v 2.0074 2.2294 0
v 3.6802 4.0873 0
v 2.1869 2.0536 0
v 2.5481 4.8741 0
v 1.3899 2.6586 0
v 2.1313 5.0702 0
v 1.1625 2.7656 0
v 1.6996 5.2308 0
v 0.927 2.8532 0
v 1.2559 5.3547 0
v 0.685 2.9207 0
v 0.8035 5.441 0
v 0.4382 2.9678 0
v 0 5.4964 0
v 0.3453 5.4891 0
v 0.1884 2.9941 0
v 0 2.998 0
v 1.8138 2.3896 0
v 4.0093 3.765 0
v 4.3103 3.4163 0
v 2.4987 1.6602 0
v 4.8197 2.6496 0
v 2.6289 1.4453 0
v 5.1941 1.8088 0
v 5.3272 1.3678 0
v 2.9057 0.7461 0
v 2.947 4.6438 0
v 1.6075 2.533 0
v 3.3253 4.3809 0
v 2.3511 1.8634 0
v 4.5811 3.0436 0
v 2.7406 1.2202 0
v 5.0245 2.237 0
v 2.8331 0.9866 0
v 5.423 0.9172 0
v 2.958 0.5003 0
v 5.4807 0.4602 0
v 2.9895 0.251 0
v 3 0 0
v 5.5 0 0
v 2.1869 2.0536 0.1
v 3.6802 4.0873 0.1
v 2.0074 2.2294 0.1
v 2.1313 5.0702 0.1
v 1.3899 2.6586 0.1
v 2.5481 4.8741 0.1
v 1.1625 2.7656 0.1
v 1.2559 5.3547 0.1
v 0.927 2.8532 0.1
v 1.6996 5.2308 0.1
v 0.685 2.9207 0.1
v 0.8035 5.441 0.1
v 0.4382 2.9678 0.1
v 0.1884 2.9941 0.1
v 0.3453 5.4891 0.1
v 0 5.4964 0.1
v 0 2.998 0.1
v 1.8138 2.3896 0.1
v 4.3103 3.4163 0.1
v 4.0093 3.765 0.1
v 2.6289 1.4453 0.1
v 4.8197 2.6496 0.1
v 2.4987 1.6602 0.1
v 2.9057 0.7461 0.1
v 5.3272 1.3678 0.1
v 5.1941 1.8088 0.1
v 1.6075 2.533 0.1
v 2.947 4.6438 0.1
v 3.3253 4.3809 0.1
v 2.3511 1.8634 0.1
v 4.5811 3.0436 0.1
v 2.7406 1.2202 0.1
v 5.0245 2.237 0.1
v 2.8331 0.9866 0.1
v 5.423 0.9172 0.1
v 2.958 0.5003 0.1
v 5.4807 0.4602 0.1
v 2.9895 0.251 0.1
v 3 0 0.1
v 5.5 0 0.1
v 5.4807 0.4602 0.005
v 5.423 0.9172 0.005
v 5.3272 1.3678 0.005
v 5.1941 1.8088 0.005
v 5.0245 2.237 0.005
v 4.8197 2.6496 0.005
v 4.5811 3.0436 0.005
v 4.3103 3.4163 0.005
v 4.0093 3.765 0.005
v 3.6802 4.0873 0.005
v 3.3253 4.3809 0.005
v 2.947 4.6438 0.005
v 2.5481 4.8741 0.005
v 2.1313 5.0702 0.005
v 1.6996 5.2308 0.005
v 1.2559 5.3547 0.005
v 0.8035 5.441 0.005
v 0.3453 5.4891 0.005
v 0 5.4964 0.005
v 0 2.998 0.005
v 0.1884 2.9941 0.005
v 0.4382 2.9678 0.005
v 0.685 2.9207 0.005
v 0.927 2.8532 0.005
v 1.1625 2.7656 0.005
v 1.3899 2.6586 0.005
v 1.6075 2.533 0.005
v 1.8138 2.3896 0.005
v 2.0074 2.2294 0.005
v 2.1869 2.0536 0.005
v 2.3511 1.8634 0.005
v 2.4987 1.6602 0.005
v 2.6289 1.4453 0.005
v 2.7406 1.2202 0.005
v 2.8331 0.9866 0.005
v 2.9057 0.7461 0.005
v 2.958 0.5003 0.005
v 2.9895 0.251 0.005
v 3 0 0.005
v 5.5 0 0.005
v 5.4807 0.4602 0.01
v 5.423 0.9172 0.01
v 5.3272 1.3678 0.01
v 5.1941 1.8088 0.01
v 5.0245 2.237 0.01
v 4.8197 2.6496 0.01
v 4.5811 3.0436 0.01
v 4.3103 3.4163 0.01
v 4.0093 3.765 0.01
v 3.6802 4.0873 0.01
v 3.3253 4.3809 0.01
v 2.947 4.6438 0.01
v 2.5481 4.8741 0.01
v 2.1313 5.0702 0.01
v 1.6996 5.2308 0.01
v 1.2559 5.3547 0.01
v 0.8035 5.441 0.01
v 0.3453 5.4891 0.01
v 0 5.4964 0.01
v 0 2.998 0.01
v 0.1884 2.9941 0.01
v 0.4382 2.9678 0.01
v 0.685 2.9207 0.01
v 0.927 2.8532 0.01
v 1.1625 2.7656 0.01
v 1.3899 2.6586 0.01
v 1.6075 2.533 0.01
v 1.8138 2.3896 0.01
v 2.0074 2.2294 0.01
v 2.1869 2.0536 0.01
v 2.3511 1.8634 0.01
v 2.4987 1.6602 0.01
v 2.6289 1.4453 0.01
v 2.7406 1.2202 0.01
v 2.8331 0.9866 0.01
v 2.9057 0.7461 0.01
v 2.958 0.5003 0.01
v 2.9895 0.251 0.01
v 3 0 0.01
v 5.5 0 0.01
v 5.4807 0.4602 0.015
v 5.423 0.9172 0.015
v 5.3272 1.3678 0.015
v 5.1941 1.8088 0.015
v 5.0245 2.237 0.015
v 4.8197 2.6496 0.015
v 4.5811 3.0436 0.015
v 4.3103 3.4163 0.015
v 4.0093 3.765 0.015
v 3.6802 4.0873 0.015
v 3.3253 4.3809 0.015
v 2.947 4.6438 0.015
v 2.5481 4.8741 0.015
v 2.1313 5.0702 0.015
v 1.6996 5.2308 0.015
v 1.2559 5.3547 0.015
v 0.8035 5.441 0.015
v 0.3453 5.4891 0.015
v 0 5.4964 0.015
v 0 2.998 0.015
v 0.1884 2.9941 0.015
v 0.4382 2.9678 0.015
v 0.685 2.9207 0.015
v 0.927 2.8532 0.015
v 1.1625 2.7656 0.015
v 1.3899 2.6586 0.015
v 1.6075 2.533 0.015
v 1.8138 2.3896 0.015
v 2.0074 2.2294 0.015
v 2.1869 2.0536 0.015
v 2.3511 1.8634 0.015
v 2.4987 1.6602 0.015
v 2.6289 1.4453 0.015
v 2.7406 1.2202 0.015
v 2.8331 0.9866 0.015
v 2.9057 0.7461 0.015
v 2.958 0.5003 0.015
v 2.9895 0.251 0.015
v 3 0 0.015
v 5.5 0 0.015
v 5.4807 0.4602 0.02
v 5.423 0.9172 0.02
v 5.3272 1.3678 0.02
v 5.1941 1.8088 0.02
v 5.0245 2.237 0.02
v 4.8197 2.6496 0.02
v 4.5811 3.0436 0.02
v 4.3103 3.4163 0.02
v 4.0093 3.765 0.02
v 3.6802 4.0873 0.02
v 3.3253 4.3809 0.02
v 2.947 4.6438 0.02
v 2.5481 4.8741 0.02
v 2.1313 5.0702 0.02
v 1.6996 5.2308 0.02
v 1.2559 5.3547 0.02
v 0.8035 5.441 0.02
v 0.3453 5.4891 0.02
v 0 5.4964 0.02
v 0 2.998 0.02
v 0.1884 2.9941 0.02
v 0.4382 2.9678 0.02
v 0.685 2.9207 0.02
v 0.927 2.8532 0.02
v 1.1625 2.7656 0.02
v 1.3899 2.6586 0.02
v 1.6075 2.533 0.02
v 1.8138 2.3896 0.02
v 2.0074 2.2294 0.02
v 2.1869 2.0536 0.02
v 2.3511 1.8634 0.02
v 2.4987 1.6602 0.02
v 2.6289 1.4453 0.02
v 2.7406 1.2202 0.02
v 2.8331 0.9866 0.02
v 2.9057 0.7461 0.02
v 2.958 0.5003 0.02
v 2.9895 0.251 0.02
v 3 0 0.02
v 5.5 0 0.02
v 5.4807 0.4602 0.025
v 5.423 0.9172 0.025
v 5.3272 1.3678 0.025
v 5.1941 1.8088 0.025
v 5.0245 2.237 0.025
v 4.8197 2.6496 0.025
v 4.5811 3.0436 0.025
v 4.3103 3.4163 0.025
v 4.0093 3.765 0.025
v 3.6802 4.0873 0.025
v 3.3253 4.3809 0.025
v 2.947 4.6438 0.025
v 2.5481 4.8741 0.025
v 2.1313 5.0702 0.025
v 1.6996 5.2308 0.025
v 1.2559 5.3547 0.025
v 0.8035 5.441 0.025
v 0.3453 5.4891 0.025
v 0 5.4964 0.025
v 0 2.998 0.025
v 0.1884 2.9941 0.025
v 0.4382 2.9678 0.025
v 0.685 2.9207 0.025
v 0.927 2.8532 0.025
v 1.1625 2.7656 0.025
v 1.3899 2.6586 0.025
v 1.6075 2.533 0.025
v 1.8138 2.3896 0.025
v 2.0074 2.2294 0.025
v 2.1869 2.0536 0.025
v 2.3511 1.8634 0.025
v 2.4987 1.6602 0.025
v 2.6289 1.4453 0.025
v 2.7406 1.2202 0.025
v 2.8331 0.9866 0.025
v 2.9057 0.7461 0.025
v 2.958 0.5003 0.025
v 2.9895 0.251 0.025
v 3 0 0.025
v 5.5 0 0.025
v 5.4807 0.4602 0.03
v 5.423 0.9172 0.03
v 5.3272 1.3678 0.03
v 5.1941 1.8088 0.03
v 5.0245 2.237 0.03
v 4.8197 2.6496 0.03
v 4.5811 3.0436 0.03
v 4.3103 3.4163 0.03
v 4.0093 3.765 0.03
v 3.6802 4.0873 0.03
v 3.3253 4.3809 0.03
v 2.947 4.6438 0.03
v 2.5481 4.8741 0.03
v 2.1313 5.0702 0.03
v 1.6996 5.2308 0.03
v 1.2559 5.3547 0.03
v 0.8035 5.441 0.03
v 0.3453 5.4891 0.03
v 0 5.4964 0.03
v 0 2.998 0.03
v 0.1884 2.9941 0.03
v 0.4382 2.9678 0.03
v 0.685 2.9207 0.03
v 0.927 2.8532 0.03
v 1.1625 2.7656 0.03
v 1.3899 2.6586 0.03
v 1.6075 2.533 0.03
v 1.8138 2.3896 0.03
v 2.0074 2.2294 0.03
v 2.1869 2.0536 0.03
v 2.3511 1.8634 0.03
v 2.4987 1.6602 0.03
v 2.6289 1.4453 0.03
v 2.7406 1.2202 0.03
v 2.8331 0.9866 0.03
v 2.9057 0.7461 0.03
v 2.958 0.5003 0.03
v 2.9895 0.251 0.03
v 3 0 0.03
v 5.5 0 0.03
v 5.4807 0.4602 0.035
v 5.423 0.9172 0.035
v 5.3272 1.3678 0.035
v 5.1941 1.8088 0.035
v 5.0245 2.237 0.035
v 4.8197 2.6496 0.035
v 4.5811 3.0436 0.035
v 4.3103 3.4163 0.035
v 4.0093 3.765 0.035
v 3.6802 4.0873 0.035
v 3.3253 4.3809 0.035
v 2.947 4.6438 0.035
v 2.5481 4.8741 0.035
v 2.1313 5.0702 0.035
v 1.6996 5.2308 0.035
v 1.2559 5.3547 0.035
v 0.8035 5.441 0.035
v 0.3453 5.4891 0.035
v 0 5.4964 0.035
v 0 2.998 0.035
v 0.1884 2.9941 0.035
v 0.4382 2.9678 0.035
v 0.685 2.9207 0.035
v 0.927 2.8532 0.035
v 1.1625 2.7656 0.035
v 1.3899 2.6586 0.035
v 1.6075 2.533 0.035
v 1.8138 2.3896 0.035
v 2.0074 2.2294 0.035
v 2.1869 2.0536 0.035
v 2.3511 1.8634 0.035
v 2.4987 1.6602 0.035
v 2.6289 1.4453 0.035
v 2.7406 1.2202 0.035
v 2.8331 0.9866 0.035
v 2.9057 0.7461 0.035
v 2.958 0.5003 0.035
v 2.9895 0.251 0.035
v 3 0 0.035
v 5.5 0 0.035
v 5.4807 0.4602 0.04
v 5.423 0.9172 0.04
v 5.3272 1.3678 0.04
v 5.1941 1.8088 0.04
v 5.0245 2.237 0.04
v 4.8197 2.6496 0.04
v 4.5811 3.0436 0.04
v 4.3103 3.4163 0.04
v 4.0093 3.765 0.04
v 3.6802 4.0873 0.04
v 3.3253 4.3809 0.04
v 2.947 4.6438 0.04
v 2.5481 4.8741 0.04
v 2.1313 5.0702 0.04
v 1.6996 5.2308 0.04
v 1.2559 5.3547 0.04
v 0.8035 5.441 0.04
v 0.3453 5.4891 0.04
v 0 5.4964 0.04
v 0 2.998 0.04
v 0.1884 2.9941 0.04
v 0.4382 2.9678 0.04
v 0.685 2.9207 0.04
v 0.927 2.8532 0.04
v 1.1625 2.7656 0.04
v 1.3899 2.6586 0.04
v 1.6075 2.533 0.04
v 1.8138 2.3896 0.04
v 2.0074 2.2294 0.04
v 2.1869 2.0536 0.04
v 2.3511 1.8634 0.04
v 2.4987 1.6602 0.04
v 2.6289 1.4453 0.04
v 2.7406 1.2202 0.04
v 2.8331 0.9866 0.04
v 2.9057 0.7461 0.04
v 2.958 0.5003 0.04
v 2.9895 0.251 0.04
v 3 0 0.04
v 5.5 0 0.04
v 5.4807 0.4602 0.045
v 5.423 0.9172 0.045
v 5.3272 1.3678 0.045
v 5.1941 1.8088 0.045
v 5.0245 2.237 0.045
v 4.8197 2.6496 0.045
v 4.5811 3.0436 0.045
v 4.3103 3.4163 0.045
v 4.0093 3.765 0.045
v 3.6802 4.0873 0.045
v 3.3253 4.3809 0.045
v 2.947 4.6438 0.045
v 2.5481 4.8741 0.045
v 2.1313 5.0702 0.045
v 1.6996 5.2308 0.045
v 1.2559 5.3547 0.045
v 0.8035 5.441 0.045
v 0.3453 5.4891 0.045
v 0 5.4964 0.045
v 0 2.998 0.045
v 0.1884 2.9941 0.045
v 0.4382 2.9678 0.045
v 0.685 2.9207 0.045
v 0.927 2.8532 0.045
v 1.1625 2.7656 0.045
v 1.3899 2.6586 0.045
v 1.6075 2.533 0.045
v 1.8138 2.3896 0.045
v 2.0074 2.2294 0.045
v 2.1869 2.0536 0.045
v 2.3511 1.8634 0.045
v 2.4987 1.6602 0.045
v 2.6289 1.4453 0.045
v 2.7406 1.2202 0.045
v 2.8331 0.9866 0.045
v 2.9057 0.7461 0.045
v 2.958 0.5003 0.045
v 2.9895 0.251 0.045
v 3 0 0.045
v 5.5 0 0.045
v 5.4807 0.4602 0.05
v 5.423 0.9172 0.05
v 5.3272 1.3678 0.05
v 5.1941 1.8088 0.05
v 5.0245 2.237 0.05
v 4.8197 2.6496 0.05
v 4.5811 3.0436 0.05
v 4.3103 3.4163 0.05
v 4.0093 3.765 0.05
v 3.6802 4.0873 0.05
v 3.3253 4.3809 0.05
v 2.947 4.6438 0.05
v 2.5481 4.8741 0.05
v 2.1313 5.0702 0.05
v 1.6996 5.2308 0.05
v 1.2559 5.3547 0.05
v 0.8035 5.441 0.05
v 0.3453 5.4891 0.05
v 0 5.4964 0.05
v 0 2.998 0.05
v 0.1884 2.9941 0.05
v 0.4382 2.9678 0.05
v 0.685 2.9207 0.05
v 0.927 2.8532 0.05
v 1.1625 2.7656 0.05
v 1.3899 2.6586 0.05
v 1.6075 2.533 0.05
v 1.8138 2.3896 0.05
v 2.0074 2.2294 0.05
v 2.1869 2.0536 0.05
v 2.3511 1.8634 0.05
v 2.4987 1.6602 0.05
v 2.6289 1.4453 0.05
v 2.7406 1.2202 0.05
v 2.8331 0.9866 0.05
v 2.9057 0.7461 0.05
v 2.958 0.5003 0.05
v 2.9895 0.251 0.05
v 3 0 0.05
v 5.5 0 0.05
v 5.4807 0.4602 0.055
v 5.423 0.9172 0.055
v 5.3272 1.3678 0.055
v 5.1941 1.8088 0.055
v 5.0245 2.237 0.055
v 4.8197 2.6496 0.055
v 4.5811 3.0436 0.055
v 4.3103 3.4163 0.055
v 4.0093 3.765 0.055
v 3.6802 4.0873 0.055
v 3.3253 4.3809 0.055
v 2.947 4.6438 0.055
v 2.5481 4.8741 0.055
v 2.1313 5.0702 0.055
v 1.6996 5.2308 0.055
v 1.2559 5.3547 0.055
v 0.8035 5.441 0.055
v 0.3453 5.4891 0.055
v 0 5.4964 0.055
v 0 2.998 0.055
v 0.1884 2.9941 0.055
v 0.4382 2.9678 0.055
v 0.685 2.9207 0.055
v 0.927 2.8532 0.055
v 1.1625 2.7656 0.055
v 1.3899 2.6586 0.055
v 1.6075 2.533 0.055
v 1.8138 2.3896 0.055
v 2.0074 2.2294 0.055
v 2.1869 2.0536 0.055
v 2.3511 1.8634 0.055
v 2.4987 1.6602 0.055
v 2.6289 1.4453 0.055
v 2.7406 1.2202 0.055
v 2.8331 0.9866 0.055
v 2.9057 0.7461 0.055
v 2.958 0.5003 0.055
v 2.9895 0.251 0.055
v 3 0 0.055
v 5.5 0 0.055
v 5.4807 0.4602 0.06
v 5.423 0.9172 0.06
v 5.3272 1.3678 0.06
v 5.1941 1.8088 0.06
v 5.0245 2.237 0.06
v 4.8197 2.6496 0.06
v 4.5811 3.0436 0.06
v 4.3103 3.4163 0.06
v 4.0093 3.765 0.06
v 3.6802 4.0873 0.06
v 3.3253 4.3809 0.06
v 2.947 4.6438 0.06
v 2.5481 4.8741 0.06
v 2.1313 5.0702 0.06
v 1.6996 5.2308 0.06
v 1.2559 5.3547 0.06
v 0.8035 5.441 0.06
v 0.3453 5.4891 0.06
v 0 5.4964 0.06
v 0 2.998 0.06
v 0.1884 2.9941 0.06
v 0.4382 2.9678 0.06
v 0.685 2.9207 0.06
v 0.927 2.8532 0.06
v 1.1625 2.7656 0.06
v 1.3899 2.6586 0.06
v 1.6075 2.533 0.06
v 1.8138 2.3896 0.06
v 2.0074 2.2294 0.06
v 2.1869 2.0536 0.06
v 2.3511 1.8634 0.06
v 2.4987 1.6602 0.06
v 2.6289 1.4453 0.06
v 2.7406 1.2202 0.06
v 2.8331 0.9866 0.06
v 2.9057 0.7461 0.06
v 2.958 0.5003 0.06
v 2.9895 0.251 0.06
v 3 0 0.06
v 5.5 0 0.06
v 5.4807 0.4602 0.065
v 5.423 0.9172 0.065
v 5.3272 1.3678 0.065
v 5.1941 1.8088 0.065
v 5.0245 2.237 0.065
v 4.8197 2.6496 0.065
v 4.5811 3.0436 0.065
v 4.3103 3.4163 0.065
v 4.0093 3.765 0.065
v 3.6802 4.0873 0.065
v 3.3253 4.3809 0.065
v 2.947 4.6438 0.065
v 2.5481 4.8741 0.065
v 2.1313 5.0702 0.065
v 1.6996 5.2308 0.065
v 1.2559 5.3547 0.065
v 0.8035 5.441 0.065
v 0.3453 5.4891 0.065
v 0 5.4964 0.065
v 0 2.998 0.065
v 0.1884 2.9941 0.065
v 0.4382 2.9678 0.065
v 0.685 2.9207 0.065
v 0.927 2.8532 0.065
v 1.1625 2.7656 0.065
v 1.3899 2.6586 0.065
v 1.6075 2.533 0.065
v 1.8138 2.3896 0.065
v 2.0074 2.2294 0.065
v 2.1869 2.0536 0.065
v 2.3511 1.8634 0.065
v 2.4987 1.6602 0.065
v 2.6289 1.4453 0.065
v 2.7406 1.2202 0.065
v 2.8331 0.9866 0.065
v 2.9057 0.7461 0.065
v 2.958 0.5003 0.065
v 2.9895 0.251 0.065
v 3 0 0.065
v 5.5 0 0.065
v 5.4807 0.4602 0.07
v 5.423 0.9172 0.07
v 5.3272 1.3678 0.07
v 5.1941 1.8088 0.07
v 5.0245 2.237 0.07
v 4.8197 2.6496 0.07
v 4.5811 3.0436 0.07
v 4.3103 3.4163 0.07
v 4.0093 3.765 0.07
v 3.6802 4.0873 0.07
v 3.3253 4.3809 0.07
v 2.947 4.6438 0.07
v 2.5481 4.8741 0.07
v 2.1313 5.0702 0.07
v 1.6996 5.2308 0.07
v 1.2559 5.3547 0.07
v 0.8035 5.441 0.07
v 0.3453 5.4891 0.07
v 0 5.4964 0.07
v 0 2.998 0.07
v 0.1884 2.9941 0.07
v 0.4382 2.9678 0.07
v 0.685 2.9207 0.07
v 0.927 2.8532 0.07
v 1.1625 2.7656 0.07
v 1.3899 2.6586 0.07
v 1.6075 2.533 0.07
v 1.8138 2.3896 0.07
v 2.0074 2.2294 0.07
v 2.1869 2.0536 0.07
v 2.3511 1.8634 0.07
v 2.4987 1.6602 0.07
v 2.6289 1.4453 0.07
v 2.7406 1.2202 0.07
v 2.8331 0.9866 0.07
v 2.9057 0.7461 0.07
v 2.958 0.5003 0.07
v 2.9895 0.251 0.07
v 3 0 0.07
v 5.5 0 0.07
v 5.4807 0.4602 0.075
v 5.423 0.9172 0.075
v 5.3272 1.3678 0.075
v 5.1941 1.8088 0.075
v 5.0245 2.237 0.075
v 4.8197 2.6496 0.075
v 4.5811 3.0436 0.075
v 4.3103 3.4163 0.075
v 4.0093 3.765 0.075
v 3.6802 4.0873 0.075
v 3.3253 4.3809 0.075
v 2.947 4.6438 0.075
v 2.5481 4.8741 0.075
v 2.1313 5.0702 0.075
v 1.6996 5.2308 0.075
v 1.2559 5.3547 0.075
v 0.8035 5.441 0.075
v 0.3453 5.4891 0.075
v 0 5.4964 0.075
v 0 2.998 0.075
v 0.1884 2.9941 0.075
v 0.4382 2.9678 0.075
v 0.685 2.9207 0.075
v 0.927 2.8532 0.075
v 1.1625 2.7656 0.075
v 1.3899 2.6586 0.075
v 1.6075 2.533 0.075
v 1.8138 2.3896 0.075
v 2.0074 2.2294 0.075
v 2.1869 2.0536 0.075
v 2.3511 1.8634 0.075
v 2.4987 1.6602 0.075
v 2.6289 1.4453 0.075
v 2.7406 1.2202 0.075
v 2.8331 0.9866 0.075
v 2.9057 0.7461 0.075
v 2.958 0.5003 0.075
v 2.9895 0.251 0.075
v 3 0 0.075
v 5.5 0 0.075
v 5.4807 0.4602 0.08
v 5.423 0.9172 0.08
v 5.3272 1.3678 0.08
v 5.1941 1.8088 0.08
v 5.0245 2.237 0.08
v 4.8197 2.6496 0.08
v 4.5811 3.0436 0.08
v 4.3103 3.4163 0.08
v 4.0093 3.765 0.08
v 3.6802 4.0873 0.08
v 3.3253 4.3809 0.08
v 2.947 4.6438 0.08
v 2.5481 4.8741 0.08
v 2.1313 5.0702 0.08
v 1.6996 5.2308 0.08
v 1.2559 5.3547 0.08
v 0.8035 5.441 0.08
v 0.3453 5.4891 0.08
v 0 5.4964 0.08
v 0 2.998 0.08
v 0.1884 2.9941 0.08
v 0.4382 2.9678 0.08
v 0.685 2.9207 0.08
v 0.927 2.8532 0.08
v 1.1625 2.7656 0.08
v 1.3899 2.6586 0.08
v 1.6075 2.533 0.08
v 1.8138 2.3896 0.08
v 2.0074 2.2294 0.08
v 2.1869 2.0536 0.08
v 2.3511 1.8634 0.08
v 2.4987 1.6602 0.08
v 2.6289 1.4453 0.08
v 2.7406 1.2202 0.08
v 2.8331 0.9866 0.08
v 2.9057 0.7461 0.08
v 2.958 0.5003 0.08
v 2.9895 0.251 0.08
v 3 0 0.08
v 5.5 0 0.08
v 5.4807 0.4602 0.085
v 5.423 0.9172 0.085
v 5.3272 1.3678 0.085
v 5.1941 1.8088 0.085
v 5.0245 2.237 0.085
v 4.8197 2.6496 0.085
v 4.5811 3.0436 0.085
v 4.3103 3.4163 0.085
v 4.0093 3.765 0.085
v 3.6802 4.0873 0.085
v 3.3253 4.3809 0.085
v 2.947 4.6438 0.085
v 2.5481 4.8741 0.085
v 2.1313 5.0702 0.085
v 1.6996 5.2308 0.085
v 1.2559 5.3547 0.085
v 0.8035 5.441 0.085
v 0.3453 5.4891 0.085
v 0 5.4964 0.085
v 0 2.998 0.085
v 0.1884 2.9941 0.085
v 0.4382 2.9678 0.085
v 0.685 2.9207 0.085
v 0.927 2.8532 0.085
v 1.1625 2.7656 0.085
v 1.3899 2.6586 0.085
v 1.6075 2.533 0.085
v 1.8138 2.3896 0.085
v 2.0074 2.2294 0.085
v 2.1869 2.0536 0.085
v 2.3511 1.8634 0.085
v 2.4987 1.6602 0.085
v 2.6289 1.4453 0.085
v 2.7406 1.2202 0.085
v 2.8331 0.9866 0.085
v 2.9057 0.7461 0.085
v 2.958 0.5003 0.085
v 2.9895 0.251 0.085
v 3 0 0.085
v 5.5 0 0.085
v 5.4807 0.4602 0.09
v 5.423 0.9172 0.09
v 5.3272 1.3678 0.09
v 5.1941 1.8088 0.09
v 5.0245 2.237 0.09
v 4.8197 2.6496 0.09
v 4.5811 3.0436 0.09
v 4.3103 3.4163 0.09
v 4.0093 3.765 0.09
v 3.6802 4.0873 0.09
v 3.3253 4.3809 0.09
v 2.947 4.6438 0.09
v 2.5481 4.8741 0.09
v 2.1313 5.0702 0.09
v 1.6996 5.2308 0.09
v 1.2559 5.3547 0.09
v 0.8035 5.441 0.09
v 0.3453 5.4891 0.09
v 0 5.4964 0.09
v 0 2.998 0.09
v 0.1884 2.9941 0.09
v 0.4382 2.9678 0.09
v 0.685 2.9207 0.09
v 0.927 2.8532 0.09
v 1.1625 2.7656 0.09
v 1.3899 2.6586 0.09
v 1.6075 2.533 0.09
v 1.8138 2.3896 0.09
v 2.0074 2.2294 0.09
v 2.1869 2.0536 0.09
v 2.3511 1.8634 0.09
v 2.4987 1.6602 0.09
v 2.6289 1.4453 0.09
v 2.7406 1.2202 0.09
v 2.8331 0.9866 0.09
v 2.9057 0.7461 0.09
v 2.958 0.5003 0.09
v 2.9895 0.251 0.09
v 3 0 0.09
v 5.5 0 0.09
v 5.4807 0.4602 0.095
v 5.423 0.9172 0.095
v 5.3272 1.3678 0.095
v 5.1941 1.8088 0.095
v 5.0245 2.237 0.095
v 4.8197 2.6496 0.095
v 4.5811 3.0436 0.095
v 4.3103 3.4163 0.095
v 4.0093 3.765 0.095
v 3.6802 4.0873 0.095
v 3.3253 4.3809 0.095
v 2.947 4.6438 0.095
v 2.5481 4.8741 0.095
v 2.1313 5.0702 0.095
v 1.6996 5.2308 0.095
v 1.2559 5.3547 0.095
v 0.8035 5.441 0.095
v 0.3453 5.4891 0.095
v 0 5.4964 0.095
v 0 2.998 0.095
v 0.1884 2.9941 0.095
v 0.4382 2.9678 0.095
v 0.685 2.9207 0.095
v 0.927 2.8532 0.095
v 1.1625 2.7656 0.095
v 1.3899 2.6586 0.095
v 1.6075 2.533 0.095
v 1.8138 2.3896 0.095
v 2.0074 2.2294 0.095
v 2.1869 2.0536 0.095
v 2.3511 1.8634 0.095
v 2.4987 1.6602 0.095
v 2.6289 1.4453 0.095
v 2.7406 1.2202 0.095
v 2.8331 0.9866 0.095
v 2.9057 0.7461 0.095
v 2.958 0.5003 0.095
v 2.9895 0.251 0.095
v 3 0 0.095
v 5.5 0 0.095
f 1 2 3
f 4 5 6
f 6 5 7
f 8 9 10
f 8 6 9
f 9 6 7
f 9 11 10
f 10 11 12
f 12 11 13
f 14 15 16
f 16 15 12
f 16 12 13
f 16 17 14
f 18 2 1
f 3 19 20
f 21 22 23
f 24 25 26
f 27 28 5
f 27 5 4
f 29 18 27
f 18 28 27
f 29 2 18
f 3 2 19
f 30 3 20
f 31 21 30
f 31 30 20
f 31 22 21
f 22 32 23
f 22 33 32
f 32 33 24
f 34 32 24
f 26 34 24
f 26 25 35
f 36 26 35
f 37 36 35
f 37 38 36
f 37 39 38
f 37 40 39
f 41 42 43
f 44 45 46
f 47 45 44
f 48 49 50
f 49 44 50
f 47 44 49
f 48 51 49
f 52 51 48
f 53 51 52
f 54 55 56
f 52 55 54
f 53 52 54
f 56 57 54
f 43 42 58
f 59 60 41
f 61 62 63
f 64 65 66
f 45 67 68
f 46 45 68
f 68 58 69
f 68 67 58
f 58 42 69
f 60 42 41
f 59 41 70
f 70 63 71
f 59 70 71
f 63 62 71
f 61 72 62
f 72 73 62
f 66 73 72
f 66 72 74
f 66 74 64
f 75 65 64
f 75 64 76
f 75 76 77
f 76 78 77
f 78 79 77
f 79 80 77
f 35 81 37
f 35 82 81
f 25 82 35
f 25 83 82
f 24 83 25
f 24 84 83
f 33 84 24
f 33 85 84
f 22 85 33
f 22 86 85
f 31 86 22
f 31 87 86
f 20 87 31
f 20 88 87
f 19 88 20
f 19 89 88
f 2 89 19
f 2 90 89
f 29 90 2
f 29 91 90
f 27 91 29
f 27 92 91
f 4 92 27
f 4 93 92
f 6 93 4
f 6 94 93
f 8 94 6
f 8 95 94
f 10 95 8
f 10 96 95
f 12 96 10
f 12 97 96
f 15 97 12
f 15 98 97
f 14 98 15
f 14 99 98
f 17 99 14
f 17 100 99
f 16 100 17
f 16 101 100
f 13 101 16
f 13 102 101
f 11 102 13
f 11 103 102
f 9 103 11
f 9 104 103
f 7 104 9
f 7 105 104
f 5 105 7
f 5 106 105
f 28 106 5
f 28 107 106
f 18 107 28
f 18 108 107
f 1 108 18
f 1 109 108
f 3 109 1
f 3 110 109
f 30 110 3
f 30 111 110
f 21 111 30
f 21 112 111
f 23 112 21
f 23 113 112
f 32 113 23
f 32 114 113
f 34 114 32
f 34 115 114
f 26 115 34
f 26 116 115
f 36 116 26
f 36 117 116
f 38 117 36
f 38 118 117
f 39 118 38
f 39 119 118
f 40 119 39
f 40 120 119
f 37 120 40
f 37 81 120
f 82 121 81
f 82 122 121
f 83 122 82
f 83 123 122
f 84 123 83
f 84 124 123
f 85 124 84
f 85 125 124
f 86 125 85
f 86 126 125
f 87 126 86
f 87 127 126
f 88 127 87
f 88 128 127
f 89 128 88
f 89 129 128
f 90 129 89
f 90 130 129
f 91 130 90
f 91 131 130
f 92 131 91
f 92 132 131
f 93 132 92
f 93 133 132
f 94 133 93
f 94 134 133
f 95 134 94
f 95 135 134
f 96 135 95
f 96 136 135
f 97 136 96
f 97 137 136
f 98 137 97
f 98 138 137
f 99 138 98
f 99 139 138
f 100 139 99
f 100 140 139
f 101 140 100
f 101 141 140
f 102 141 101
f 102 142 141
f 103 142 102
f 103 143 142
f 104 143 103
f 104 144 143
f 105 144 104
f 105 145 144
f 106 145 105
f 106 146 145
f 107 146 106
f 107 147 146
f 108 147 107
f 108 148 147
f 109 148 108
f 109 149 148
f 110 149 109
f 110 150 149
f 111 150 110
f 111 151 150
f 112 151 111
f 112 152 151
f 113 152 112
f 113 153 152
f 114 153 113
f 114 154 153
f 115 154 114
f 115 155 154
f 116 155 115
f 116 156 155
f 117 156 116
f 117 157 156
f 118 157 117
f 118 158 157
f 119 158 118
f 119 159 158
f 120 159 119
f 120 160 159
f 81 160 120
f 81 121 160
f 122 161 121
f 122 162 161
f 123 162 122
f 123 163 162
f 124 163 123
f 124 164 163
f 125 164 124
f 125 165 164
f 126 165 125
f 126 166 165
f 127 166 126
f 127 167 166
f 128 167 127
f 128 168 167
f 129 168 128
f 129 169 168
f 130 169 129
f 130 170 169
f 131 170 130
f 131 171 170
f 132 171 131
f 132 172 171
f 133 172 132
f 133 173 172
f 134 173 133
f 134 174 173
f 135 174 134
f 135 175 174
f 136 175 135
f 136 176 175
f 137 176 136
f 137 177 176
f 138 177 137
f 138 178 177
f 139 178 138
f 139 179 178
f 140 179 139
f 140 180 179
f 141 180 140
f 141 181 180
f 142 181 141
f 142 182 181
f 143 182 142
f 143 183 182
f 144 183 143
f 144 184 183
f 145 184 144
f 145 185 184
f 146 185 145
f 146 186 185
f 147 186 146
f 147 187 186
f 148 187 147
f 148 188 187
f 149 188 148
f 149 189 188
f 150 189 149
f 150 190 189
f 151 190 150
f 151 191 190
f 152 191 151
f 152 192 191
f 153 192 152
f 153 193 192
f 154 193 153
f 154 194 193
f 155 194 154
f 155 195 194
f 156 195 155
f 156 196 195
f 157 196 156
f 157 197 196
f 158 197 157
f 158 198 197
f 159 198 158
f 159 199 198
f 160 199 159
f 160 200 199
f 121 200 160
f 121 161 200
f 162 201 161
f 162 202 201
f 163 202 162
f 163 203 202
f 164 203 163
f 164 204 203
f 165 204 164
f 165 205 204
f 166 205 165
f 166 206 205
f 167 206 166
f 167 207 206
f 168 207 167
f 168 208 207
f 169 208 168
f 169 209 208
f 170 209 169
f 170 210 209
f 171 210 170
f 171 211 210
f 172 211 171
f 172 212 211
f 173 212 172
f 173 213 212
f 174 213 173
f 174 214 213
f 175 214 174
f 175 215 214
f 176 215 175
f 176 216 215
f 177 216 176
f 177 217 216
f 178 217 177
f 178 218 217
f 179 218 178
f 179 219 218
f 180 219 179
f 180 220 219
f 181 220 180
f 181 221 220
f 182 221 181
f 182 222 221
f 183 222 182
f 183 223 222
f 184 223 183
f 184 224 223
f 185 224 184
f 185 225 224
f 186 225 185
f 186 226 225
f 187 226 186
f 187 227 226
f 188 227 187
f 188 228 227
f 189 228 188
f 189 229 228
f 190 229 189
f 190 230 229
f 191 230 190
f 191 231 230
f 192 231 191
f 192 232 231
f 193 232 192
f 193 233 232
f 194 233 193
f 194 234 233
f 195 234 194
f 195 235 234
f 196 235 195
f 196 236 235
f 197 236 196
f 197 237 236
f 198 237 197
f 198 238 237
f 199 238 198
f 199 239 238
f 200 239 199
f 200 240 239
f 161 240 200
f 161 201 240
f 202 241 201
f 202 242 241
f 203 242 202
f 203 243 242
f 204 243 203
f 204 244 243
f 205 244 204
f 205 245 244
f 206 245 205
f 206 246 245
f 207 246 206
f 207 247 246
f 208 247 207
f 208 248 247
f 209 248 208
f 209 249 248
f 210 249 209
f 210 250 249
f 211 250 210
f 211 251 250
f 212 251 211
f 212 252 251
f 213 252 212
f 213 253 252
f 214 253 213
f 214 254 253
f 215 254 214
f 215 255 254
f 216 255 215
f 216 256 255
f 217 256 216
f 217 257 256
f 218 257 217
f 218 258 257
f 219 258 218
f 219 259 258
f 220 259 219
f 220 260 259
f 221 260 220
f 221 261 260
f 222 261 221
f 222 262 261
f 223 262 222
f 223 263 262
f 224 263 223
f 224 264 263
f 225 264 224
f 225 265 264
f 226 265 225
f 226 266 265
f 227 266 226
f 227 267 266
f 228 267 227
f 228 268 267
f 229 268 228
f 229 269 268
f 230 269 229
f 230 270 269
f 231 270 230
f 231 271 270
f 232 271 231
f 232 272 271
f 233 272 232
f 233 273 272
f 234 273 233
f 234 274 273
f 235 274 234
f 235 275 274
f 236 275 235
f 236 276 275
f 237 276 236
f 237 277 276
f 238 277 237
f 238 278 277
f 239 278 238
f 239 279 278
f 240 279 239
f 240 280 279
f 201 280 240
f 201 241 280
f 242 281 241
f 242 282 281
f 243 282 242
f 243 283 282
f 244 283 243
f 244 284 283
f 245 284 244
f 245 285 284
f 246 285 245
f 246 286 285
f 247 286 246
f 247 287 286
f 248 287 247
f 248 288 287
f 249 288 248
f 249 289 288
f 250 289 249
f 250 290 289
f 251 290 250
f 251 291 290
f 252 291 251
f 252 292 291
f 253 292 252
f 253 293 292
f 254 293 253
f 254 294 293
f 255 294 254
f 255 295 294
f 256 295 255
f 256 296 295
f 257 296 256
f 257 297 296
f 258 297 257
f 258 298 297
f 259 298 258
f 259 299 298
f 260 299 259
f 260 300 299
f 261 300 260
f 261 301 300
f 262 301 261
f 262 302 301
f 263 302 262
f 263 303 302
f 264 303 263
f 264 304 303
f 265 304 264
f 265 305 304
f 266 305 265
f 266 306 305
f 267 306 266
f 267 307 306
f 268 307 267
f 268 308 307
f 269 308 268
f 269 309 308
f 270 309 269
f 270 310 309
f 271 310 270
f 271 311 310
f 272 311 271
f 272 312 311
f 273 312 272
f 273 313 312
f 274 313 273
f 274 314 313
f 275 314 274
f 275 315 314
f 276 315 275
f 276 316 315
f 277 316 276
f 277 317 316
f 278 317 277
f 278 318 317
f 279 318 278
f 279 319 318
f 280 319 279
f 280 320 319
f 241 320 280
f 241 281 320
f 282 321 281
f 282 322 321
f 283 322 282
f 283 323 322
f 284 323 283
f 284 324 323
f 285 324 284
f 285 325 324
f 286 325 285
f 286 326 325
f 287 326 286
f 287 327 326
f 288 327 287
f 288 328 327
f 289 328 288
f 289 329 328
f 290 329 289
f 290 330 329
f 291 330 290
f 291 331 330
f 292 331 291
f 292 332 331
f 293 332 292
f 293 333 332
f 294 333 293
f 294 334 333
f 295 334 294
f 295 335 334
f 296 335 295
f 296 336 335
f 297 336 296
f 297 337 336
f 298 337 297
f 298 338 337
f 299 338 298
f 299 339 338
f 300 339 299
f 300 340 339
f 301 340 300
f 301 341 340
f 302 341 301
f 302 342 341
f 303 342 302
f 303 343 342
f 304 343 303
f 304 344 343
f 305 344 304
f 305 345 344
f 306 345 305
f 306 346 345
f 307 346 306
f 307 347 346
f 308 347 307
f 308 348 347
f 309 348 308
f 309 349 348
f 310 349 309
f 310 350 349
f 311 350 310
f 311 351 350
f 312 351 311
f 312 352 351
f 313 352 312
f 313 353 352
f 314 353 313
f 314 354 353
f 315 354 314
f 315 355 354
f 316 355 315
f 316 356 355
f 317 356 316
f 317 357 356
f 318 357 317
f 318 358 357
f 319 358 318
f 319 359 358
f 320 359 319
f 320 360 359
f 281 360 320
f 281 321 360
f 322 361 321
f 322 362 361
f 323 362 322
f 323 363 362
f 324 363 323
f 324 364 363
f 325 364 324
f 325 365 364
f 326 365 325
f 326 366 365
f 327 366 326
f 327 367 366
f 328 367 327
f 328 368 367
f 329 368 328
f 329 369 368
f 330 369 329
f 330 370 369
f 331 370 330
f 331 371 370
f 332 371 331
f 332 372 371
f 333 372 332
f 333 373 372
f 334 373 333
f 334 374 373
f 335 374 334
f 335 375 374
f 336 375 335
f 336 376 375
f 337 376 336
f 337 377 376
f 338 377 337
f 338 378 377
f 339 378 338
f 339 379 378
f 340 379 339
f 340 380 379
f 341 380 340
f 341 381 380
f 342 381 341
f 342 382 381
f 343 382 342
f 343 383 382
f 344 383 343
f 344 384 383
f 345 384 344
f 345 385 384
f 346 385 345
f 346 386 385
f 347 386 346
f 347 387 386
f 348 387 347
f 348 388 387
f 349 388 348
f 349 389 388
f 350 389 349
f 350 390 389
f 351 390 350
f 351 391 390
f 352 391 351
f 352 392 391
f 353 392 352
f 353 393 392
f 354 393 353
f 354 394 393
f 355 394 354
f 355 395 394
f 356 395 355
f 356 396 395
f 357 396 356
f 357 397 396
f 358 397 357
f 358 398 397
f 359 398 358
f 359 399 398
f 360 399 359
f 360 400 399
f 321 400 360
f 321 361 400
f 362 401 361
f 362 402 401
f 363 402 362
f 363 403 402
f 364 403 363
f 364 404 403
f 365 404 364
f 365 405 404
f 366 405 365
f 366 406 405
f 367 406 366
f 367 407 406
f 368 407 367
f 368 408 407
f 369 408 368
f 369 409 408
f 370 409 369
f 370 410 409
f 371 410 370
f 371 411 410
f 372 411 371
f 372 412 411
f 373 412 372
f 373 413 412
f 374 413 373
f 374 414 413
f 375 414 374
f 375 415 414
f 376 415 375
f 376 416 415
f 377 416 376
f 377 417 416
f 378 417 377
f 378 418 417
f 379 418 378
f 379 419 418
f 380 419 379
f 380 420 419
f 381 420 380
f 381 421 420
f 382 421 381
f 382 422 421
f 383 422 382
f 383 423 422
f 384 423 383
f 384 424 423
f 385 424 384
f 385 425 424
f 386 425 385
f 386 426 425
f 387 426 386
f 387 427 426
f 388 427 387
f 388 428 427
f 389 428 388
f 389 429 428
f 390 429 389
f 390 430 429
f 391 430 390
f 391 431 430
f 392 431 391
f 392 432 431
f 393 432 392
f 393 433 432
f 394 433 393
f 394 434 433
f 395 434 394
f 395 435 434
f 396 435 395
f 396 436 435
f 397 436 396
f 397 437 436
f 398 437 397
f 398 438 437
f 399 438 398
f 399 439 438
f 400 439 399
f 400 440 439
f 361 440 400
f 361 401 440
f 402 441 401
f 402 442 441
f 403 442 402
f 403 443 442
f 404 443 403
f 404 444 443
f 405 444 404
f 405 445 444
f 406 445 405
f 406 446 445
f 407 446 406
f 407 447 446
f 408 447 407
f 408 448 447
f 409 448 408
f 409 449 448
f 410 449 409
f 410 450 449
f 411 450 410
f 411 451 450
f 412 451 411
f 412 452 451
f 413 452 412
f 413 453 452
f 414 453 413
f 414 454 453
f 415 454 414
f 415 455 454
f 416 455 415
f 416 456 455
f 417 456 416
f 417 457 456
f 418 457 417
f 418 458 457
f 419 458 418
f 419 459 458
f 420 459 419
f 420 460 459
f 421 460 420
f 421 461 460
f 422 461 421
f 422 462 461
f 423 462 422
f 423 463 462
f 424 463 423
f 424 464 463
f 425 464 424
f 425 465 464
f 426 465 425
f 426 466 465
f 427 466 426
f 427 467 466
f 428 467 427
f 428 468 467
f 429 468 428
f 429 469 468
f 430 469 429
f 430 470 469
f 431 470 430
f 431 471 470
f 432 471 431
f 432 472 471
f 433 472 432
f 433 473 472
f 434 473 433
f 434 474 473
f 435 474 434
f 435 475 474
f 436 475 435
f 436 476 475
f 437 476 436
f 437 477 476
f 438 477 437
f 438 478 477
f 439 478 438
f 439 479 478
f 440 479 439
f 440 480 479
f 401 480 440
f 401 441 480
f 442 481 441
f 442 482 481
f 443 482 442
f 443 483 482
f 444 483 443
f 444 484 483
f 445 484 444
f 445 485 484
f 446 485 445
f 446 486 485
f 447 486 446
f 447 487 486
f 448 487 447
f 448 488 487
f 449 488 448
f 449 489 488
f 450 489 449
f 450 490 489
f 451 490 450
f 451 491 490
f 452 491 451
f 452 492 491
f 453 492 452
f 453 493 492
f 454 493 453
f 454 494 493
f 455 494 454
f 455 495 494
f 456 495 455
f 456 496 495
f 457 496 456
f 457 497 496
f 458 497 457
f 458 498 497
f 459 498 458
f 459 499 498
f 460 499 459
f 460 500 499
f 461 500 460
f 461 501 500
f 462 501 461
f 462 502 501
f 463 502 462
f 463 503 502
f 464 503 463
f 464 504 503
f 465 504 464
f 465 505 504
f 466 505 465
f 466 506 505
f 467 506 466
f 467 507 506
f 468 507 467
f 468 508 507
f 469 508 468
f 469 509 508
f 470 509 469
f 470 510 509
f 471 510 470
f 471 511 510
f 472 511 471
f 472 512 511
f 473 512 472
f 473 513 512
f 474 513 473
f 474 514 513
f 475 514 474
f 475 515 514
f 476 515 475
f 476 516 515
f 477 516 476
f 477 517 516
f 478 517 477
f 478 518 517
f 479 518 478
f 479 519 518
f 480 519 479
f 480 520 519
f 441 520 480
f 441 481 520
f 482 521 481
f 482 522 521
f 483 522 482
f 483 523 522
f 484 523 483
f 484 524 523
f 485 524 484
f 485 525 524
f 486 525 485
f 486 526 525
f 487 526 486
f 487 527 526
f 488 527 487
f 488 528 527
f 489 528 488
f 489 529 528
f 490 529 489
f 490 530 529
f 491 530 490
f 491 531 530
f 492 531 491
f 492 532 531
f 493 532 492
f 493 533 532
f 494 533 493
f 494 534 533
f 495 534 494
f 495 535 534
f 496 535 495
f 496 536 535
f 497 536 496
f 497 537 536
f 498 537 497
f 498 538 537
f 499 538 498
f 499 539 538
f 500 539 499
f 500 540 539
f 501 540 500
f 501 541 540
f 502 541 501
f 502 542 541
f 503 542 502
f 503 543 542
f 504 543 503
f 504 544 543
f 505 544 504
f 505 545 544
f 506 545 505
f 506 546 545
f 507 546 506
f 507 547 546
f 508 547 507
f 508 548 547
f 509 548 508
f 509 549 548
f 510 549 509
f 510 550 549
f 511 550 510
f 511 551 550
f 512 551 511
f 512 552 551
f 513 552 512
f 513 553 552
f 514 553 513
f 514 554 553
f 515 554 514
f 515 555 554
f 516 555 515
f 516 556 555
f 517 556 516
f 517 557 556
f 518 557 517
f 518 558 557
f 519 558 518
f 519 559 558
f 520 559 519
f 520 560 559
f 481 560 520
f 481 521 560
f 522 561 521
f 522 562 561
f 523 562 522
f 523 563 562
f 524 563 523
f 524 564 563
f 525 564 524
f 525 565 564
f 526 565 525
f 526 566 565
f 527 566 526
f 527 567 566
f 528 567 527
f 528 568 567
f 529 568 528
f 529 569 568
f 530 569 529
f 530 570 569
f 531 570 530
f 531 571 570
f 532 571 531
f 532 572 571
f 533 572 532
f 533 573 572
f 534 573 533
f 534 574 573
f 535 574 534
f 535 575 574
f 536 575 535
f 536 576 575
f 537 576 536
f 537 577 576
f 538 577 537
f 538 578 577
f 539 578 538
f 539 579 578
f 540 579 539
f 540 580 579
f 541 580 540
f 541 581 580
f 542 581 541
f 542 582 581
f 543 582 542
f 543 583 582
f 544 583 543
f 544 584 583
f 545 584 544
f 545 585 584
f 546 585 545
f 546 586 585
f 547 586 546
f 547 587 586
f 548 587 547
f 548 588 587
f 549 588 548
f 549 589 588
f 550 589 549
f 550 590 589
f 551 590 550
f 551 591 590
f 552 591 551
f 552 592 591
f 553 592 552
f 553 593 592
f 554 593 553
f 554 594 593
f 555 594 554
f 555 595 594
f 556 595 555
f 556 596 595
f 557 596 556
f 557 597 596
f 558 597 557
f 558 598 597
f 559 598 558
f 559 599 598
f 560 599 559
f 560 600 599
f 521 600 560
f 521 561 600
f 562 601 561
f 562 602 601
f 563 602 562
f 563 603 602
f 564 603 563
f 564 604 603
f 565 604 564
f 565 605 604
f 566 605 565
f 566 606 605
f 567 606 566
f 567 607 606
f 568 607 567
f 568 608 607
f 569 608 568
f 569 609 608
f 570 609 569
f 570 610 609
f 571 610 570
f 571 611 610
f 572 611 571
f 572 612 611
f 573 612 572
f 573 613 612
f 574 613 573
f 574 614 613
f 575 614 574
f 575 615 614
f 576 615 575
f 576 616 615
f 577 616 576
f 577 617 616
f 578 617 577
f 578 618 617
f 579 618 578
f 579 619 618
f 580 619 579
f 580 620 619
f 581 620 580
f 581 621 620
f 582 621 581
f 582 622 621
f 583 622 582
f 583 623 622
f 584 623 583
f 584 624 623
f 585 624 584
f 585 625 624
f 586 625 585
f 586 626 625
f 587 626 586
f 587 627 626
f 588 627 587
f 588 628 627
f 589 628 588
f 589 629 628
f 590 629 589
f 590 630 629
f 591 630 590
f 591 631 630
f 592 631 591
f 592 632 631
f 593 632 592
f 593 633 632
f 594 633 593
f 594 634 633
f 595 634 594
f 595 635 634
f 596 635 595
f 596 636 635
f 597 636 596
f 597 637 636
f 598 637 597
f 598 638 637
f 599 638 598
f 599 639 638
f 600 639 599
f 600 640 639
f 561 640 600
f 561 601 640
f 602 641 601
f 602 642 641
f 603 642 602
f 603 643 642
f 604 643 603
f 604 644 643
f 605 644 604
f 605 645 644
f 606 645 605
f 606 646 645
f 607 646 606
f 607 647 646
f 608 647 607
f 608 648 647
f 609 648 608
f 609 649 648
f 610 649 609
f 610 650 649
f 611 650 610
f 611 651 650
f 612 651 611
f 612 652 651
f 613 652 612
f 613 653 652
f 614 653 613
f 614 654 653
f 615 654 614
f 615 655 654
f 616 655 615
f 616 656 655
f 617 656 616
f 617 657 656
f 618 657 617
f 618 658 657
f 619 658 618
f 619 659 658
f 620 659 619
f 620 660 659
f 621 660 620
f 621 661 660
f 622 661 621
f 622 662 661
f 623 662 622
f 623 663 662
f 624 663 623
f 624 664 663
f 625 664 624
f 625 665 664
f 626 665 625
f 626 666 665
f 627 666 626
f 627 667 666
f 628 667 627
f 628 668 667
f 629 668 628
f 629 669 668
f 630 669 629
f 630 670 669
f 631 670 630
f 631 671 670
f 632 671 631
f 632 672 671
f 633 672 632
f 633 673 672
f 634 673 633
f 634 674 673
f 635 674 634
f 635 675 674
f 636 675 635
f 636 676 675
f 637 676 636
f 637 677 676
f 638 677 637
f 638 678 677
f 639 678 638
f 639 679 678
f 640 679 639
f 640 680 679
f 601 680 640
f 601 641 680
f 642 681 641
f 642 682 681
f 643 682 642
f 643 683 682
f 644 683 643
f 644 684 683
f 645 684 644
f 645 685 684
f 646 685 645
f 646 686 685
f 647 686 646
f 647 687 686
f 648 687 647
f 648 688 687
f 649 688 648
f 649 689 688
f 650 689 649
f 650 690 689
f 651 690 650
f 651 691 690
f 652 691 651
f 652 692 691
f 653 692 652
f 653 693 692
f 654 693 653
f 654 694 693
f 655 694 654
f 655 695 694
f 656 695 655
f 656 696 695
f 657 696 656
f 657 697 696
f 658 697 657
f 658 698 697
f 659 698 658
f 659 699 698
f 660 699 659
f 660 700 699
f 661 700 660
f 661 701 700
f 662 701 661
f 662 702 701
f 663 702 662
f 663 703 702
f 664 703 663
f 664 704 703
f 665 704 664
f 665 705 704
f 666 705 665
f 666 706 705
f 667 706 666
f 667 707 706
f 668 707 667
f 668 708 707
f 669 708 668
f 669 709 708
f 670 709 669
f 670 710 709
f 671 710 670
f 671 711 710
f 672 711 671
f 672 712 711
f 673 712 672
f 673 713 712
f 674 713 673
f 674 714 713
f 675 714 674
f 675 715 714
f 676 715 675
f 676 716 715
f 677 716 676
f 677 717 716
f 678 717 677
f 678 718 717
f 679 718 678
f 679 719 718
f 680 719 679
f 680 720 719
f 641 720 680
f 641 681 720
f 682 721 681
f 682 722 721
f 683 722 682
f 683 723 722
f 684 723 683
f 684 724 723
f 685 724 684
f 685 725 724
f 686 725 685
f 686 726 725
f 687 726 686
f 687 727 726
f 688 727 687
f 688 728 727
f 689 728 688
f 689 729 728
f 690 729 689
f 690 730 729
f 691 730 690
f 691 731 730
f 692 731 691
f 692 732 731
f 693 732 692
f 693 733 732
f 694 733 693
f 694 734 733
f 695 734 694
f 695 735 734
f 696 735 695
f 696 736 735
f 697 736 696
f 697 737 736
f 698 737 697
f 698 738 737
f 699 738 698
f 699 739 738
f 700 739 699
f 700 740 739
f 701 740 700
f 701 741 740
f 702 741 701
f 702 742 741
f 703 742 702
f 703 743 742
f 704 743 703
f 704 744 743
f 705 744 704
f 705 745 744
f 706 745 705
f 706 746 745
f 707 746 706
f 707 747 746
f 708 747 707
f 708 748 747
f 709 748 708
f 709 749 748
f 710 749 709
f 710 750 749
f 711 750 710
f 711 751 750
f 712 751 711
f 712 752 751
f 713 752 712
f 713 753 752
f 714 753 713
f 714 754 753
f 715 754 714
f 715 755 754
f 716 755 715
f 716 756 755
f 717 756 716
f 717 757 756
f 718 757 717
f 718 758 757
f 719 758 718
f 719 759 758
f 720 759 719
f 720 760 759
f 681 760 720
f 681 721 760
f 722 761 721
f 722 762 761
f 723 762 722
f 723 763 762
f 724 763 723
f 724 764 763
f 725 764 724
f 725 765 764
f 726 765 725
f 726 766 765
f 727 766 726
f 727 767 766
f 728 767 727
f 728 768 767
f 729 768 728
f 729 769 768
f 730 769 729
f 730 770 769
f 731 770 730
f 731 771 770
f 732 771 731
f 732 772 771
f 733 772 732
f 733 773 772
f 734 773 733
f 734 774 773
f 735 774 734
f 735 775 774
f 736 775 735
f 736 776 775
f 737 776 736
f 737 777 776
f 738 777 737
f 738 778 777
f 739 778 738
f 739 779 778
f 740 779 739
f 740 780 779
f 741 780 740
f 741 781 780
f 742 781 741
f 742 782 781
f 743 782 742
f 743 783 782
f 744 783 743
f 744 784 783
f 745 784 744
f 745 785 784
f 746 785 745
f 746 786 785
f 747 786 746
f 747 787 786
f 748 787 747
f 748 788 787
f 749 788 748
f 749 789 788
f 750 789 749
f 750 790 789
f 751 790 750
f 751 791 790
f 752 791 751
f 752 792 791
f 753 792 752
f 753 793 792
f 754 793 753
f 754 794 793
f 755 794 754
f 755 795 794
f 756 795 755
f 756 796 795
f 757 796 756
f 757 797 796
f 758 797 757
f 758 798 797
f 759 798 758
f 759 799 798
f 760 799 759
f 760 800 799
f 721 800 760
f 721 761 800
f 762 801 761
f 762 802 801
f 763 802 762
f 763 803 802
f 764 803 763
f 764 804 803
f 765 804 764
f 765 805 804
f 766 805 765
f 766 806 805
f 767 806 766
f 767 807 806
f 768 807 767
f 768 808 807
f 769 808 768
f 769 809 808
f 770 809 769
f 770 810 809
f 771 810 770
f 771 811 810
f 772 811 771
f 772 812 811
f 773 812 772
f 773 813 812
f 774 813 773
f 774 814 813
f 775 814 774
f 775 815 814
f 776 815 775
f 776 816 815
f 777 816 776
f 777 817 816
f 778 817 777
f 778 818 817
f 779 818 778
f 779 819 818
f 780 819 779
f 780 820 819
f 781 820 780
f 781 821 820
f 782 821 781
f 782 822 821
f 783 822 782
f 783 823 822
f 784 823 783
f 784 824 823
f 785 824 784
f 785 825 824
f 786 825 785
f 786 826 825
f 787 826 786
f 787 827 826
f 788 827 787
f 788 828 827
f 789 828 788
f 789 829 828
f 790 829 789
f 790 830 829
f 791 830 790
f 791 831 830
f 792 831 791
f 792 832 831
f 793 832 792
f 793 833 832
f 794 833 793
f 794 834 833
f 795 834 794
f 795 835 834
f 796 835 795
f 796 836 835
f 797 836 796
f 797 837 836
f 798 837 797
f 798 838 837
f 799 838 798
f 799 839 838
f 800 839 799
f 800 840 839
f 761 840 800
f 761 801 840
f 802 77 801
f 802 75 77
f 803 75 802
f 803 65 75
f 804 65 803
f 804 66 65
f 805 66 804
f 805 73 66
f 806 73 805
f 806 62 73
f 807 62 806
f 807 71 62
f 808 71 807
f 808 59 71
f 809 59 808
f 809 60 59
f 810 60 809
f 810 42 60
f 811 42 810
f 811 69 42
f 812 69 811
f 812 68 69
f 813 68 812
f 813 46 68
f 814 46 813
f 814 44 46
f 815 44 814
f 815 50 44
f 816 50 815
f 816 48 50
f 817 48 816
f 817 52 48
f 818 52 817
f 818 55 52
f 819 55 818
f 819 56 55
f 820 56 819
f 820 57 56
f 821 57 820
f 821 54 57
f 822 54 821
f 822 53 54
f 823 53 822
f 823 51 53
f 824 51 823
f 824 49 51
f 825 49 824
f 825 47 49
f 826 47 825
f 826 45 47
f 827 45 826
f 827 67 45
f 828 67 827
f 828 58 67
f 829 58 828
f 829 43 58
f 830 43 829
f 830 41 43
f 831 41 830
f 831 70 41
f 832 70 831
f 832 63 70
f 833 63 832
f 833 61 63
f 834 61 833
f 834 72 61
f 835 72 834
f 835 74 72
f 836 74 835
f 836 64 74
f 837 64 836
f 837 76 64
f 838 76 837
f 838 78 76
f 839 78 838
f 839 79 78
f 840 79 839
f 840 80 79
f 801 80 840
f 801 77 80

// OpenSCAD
// created by IndiePandaaaaa|Lukas

THICKNESS = 2.5;
TOLERANCE = .15;
$fn = 75;

module platsa_side_hook(width_inside = 2, hook_width = 4.7) {
  HOOK_WIDTH_INSIDE = width_inside;
  PLATSA_SIDE_WALL_OFFSET = 25.7; // 25.7 for side hook, 42.5 for door closing
  PLATSA_MOUNTING_WIDTH = hook_width - TOLERANCE;
  PLATSA_MOUNTING_DEPTH = 19.2;

  linear_extrude(PLATSA_MOUNTING_WIDTH) {
    polygon(
      [
        [0, 0],
        [THICKNESS * 2 + HOOK_WIDTH_INSIDE, 0],
        [THICKNESS * 2 + HOOK_WIDTH_INSIDE, PLATSA_MOUNTING_DEPTH],
        [THICKNESS * 2 + HOOK_WIDTH_INSIDE + PLATSA_SIDE_WALL_OFFSET, PLATSA_MOUNTING_DEPTH],
        [THICKNESS * 2 + HOOK_WIDTH_INSIDE + PLATSA_SIDE_WALL_OFFSET, 0],
        [THICKNESS * 2 + HOOK_WIDTH_INSIDE + PLATSA_SIDE_WALL_OFFSET + PLATSA_MOUNTING_WIDTH, 0],
        [
          THICKNESS * 2 + HOOK_WIDTH_INSIDE + PLATSA_SIDE_WALL_OFFSET + PLATSA_MOUNTING_WIDTH,
          PLATSA_MOUNTING_DEPTH + THICKNESS,
        ],
        [THICKNESS + HOOK_WIDTH_INSIDE, PLATSA_MOUNTING_DEPTH + THICKNESS],
        [THICKNESS + HOOK_WIDTH_INSIDE, THICKNESS],
        [THICKNESS, THICKNESS],
        [THICKNESS, THICKNESS + HOOK_WIDTH_INSIDE],
        [0, THICKNESS + HOOK_WIDTH_INSIDE],
      ]
    );
  }
}

module sortera_bag_clamp(width, height, depth, material_thickness = 2) {
  // inspired by: https://www.printables.com/model/1419004-ikea-sortera-trash-bag-holder-frame
  
  module twoD_edge_rounded(thickness, inner_radius) {
    difference() {
      circle(r=inner_radius + thickness);
      circle(r=inner_radius);
      
      for (i=[0:2]) {
        rotate(90 + 90*i) square(inner_radius+thickness+1);
      }
    }
  }

  linear_extrude(height=depth, center=false, convexity=10, twist=0, slices=20, scale=1.0) {
    twoD_edge_rounded(material_thickness, 3);
  }
}

// TODO: add little hook on one side, chest material thickness 2.2 mm
sortera_bag_clamp(width=19.2, height=45, depth=.1, material_thickness=2.5);
